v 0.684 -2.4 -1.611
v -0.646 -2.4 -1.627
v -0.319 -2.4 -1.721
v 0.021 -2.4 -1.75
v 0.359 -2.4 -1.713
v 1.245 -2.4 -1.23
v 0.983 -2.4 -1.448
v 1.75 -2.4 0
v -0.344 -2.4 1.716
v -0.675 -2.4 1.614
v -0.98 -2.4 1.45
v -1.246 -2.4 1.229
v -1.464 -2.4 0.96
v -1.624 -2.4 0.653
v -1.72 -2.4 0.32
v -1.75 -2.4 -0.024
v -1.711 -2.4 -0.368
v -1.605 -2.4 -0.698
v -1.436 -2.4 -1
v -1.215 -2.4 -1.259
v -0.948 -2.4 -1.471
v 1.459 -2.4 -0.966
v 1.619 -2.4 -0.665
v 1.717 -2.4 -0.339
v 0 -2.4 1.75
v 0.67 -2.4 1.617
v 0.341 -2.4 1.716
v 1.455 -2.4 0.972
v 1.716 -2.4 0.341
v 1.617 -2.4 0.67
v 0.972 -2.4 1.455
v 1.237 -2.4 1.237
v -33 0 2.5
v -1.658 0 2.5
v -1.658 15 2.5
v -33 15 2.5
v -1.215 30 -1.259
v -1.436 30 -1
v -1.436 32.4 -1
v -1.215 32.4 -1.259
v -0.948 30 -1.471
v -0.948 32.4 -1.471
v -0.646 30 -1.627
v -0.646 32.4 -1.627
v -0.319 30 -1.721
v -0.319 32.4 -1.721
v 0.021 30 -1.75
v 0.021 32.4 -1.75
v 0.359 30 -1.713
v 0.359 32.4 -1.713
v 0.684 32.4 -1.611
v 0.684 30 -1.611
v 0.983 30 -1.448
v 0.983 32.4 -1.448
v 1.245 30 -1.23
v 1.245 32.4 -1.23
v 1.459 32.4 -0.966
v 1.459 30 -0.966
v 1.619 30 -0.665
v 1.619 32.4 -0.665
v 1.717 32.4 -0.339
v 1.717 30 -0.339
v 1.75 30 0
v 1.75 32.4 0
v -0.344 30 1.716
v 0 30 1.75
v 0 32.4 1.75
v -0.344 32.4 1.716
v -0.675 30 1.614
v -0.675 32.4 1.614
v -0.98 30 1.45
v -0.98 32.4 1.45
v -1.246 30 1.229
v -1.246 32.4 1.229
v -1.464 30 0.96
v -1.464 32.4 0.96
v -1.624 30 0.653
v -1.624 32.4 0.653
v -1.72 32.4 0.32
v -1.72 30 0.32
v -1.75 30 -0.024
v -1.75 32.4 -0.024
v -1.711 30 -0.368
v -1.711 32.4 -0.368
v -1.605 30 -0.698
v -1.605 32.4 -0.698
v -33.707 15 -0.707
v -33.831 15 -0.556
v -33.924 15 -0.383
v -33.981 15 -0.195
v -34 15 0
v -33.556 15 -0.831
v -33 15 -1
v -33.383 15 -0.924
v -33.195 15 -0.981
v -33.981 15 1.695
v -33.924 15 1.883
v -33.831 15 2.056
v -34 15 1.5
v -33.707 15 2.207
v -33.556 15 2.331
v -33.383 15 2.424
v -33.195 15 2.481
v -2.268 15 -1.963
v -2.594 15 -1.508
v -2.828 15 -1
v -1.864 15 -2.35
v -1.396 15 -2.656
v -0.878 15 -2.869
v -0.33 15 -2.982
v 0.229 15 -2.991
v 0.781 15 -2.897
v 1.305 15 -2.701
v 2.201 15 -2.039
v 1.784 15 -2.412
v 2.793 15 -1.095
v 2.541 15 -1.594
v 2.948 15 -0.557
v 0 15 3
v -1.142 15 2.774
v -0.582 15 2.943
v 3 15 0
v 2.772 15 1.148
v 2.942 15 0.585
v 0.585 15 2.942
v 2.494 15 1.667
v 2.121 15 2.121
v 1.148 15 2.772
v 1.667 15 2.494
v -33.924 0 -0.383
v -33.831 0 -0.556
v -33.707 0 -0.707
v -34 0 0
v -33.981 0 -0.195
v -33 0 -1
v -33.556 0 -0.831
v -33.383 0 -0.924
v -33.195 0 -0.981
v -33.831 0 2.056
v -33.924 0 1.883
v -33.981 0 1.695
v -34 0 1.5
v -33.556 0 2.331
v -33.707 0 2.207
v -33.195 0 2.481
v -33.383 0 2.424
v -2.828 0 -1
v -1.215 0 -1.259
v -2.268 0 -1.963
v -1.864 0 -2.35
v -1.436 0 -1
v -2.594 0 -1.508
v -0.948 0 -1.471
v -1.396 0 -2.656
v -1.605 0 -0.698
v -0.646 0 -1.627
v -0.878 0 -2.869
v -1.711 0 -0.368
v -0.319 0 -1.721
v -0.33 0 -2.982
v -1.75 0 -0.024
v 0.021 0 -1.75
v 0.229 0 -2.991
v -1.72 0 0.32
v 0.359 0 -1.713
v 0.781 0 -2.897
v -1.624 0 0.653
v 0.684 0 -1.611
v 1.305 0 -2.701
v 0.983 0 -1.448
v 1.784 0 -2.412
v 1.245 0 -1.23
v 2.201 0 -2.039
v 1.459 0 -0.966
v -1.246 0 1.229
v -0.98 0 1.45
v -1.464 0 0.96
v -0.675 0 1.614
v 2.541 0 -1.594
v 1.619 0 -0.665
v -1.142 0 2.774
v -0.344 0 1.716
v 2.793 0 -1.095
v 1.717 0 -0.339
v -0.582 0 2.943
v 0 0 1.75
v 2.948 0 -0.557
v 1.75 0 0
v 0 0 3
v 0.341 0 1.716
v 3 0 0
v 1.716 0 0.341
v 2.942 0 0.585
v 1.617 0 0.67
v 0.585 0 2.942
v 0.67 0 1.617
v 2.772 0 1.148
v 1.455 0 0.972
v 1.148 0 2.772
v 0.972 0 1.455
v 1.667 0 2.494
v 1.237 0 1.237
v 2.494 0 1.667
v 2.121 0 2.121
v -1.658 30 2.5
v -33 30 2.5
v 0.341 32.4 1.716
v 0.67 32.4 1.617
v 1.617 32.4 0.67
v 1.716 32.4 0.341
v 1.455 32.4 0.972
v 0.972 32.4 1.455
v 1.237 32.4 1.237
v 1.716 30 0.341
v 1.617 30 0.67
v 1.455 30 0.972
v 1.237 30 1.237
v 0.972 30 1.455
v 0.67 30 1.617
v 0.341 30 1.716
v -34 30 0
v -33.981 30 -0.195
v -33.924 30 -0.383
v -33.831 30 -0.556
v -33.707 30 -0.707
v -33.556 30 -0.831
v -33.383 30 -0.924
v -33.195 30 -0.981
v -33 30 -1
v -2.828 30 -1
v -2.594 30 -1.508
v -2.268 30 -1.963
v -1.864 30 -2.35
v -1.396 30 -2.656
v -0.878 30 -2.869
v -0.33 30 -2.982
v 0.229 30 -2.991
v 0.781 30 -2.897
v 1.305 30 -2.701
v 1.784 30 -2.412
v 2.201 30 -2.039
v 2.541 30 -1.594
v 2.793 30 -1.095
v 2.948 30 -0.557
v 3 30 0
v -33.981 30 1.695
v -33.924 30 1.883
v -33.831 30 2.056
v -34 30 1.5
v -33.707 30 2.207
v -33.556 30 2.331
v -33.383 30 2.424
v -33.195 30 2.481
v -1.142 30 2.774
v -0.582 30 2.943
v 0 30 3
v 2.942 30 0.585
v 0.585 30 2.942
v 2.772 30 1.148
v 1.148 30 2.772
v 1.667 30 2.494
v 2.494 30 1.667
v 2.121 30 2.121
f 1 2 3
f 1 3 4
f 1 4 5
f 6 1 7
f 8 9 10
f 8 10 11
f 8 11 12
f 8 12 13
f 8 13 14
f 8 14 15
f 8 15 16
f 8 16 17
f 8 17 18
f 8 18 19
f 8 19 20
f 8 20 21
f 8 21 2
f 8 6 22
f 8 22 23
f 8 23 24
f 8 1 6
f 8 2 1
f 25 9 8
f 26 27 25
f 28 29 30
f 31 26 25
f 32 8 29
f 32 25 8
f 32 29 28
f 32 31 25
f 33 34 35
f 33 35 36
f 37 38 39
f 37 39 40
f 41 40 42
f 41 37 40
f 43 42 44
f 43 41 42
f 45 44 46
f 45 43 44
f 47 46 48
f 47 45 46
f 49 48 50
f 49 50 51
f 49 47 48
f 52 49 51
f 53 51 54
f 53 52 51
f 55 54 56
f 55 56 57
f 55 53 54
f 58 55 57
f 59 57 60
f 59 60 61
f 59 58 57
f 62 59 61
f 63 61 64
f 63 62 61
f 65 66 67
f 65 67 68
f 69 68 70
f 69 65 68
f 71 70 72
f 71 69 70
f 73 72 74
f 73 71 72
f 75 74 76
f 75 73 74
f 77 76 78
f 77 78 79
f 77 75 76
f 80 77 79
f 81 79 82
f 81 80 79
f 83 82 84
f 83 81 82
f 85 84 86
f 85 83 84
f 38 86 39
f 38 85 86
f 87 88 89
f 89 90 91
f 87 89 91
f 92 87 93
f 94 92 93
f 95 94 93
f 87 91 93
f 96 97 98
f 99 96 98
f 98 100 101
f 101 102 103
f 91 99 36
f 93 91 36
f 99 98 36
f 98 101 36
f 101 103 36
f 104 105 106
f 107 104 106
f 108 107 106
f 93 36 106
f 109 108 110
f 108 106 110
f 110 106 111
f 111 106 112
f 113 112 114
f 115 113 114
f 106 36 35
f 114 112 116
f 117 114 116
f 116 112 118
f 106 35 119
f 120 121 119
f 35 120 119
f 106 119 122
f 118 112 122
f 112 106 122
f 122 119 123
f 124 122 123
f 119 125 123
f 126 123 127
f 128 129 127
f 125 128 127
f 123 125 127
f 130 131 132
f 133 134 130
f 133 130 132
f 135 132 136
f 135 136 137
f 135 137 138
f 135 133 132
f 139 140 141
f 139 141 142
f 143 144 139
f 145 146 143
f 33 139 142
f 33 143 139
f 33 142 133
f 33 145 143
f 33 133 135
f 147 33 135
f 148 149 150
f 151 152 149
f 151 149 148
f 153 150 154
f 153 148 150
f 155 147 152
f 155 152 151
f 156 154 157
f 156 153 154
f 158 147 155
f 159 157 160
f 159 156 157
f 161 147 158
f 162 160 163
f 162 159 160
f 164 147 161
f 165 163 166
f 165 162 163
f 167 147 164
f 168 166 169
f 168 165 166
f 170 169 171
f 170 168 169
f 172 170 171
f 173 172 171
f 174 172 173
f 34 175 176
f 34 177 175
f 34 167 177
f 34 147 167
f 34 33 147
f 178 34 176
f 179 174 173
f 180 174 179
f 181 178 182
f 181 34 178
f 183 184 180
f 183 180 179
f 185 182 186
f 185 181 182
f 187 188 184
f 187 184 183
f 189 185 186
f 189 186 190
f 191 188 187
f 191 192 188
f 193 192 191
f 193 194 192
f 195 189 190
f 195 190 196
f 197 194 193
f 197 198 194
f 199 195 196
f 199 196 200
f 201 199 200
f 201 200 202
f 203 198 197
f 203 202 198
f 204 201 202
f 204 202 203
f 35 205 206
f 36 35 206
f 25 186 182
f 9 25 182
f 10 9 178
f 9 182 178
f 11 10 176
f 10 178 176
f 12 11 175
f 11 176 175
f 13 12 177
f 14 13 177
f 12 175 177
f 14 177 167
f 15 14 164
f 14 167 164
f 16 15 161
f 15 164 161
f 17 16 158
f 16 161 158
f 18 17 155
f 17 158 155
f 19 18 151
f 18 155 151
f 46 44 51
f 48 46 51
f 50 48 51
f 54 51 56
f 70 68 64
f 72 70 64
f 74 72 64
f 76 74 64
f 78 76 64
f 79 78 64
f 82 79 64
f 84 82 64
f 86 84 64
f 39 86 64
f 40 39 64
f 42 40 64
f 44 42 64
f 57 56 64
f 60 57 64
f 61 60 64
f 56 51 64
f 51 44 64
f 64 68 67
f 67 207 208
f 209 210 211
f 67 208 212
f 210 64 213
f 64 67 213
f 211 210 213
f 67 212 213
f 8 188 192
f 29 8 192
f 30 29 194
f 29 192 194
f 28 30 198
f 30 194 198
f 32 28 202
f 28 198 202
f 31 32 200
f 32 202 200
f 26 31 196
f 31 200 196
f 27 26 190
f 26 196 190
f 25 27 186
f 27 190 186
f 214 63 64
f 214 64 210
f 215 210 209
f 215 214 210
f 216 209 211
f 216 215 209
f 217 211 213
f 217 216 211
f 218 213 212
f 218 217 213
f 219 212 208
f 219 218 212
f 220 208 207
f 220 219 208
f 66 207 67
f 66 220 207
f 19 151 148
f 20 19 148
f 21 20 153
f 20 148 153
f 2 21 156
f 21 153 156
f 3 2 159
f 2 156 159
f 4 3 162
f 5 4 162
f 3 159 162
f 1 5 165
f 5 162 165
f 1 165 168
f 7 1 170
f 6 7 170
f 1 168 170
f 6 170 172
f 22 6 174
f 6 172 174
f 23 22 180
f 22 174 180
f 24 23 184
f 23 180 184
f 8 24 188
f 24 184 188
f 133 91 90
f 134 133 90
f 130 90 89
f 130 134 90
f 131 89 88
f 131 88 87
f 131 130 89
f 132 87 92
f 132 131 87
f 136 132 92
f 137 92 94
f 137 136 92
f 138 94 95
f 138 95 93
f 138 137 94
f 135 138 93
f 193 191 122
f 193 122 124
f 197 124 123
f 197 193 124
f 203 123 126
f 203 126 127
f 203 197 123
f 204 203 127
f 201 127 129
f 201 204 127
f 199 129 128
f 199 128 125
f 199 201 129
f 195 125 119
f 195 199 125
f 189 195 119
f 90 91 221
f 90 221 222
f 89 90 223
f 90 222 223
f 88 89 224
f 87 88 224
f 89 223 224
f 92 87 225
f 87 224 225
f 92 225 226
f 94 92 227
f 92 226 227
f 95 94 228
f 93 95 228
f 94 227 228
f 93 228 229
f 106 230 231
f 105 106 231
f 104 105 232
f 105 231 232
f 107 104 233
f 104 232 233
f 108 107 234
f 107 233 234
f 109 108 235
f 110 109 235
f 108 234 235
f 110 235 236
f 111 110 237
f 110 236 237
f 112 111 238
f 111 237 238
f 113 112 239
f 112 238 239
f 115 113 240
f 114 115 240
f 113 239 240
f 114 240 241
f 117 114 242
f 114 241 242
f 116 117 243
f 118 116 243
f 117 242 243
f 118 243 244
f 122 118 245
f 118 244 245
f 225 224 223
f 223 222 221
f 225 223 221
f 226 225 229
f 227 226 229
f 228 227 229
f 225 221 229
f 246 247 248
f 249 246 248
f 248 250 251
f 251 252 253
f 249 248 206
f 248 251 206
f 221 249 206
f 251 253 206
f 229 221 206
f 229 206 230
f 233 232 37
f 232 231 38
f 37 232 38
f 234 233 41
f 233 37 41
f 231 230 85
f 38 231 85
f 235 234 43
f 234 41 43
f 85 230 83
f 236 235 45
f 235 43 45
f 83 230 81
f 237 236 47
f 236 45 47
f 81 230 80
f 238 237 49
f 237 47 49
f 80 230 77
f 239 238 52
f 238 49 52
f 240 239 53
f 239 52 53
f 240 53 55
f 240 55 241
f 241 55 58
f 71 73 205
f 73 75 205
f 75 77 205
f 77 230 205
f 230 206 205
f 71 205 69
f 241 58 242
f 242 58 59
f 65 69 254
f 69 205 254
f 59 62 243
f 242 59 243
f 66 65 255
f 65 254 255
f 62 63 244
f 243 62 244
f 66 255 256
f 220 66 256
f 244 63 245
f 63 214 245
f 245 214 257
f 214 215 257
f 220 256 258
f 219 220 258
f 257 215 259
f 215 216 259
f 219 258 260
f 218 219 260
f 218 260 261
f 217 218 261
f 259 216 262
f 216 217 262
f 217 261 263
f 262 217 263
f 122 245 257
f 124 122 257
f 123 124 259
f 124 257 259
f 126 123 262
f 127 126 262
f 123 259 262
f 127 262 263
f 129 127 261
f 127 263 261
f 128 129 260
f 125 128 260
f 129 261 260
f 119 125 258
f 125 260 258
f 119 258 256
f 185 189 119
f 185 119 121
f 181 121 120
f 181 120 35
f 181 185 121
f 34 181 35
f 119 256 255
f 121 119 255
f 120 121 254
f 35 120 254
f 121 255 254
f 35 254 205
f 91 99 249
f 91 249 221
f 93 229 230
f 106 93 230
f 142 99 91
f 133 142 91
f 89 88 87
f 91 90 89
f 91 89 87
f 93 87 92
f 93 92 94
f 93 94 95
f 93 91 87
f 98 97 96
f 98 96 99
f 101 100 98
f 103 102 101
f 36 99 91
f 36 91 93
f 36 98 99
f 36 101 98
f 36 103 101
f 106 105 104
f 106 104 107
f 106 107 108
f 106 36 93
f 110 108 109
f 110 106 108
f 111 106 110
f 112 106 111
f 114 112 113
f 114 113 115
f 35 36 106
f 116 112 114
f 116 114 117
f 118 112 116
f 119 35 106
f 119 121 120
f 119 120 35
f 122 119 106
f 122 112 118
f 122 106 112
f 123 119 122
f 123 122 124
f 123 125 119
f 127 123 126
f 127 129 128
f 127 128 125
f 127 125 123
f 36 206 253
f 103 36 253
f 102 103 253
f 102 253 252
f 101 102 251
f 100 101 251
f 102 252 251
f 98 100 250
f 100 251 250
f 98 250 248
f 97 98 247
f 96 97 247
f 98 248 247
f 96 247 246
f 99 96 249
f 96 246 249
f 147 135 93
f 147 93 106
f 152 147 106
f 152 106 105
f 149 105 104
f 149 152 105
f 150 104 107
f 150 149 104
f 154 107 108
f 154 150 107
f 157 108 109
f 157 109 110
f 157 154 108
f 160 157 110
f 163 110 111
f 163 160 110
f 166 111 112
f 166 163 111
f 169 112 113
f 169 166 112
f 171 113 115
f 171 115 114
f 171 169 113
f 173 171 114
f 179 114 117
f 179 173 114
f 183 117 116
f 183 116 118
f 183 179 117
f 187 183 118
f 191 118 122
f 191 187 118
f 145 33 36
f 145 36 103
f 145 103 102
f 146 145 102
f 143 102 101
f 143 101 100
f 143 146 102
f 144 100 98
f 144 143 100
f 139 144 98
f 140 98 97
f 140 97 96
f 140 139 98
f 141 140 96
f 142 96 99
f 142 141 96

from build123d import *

# Parameters (mm, degrees)
F1_DEPTH = 2.4
F2_DEPTH = 15


with BuildPart() as f1:
    # F0 (on Front) → F1 (new body)
    with BuildSketch(Plane.XZ):
        with BuildLine():
            Line((0, -1), (0, 0))
            Line((0, 0), (0, 1.75))
            ThreePointArc((0, 1.75), (-1.5512092057, 0.8100925873), (-1.4361406616, -1))
            Line((-1.4361406616, -1), (0, -1))
        make_face()
        with BuildLine():
            Line((0, 1.75), (0, 0))
            Line((0, 0), (0, -1))
            Line((0, -1), (-1.4361406616, -1))
            ThreePointArc((-1.4361406616, -1), (0.5240485866, -1.6696925103), (1.75, 0))
            ThreePointArc((1.75, 0), (1.2374368671, 1.2374368671), (0, 1.75))
        make_face()
    extrude(amount=F1_DEPTH)

    # F0 (on Front) → F2 (join)
    with BuildSketch(Plane.XZ):
        with BuildLine():
            Line((0, -1), (0, 0))
            Line((0, 0), (0, 1.75))
            ThreePointArc((0, 1.75), (-1.5512092057, 0.8100925873), (-1.4361406616, -1))
            Line((-1.4361406616, -1), (0, -1))
        make_face()
        with BuildLine():
            Line((0, 1.75), (0, 0))
            Line((0, 0), (0, -1))
            Line((0, -1), (-1.4361406616, -1))
            ThreePointArc((-1.4361406616, -1), (0.5240485866, -1.6696925103), (1.75, 0))
            ThreePointArc((1.75, 0), (1.2374368671, 1.2374368671), (0, 1.75))
        make_face()
        with BuildLine():
            ThreePointArc((-1.4361406616, -1), (-1.5512092057, 0.8100925873), (0, 1.75))
            Line((0, 1.75), (0, 2.5))
            Line((0, 2.5), (-1.6583123952, 2.5))
            ThreePointArc((-1.6583123952, 2.5), (-2.8452078799, 0.951205614), (-2.8284271247, -1))
            Line((-2.8284271247, -1), (-1.4361406616, -1))
        make_face()
        with BuildLine():
            Line((0, 2.5), (0, 1.75))
            ThreePointArc((0, 1.75), (1.2374368671, 1.2374368671), (1.75, 0))
            ThreePointArc((1.75, 0), (0.5240485866, -1.6696925103), (-1.4361406616, -1))
            Line((-1.4361406616, -1), (-2.8284271247, -1))
            ThreePointArc((-2.8284271247, -1), (0.5073059362, -2.956795679), (3, 0))
            ThreePointArc((3, 0), (2.1213203436, 2.1213203436), (0, 3))
            Line((0, 3), (0, 2.5))
        make_face()
        with BuildLine():
            Line((-1.6583123952, 2.5), (0, 2.5))
            Line((0, 2.5), (0, 3))
            ThreePointArc((0, 3), (-0.8660254038, 2.8722813233), (-1.6583123952, 2.5))
        make_face()
        with BuildLine():
            ThreePointArc((-2.8284271247, -1), (-2.8452078799, 0.951205614), (-1.6583123952, 2.5))
            Line((-1.6583123952, 2.5), (-33, 2.5))
            ThreePointArc((-33, 2.5), (-33.7071067812, 2.2071067812), (-34, 1.5))
            Line((-34, 1.5), (-34, 0))
            ThreePointArc((-34, 0), (-33.7071067812, -0.7071067812), (-33, -1))
            Line((-33, -1), (-2.8284271247, -1))
        make_face()
    extrude(amount=-F2_DEPTH)


with BuildPart() as f3_1:
    # F3: instance of F1
    add(f1.part.mirror(Plane(origin=(-14.523910756, 15, 0.6034083125), x_dir=(1, 0, 0), z_dir=(0, 1, 0))))


solid = Compound([f1.part, f3_1.part])
